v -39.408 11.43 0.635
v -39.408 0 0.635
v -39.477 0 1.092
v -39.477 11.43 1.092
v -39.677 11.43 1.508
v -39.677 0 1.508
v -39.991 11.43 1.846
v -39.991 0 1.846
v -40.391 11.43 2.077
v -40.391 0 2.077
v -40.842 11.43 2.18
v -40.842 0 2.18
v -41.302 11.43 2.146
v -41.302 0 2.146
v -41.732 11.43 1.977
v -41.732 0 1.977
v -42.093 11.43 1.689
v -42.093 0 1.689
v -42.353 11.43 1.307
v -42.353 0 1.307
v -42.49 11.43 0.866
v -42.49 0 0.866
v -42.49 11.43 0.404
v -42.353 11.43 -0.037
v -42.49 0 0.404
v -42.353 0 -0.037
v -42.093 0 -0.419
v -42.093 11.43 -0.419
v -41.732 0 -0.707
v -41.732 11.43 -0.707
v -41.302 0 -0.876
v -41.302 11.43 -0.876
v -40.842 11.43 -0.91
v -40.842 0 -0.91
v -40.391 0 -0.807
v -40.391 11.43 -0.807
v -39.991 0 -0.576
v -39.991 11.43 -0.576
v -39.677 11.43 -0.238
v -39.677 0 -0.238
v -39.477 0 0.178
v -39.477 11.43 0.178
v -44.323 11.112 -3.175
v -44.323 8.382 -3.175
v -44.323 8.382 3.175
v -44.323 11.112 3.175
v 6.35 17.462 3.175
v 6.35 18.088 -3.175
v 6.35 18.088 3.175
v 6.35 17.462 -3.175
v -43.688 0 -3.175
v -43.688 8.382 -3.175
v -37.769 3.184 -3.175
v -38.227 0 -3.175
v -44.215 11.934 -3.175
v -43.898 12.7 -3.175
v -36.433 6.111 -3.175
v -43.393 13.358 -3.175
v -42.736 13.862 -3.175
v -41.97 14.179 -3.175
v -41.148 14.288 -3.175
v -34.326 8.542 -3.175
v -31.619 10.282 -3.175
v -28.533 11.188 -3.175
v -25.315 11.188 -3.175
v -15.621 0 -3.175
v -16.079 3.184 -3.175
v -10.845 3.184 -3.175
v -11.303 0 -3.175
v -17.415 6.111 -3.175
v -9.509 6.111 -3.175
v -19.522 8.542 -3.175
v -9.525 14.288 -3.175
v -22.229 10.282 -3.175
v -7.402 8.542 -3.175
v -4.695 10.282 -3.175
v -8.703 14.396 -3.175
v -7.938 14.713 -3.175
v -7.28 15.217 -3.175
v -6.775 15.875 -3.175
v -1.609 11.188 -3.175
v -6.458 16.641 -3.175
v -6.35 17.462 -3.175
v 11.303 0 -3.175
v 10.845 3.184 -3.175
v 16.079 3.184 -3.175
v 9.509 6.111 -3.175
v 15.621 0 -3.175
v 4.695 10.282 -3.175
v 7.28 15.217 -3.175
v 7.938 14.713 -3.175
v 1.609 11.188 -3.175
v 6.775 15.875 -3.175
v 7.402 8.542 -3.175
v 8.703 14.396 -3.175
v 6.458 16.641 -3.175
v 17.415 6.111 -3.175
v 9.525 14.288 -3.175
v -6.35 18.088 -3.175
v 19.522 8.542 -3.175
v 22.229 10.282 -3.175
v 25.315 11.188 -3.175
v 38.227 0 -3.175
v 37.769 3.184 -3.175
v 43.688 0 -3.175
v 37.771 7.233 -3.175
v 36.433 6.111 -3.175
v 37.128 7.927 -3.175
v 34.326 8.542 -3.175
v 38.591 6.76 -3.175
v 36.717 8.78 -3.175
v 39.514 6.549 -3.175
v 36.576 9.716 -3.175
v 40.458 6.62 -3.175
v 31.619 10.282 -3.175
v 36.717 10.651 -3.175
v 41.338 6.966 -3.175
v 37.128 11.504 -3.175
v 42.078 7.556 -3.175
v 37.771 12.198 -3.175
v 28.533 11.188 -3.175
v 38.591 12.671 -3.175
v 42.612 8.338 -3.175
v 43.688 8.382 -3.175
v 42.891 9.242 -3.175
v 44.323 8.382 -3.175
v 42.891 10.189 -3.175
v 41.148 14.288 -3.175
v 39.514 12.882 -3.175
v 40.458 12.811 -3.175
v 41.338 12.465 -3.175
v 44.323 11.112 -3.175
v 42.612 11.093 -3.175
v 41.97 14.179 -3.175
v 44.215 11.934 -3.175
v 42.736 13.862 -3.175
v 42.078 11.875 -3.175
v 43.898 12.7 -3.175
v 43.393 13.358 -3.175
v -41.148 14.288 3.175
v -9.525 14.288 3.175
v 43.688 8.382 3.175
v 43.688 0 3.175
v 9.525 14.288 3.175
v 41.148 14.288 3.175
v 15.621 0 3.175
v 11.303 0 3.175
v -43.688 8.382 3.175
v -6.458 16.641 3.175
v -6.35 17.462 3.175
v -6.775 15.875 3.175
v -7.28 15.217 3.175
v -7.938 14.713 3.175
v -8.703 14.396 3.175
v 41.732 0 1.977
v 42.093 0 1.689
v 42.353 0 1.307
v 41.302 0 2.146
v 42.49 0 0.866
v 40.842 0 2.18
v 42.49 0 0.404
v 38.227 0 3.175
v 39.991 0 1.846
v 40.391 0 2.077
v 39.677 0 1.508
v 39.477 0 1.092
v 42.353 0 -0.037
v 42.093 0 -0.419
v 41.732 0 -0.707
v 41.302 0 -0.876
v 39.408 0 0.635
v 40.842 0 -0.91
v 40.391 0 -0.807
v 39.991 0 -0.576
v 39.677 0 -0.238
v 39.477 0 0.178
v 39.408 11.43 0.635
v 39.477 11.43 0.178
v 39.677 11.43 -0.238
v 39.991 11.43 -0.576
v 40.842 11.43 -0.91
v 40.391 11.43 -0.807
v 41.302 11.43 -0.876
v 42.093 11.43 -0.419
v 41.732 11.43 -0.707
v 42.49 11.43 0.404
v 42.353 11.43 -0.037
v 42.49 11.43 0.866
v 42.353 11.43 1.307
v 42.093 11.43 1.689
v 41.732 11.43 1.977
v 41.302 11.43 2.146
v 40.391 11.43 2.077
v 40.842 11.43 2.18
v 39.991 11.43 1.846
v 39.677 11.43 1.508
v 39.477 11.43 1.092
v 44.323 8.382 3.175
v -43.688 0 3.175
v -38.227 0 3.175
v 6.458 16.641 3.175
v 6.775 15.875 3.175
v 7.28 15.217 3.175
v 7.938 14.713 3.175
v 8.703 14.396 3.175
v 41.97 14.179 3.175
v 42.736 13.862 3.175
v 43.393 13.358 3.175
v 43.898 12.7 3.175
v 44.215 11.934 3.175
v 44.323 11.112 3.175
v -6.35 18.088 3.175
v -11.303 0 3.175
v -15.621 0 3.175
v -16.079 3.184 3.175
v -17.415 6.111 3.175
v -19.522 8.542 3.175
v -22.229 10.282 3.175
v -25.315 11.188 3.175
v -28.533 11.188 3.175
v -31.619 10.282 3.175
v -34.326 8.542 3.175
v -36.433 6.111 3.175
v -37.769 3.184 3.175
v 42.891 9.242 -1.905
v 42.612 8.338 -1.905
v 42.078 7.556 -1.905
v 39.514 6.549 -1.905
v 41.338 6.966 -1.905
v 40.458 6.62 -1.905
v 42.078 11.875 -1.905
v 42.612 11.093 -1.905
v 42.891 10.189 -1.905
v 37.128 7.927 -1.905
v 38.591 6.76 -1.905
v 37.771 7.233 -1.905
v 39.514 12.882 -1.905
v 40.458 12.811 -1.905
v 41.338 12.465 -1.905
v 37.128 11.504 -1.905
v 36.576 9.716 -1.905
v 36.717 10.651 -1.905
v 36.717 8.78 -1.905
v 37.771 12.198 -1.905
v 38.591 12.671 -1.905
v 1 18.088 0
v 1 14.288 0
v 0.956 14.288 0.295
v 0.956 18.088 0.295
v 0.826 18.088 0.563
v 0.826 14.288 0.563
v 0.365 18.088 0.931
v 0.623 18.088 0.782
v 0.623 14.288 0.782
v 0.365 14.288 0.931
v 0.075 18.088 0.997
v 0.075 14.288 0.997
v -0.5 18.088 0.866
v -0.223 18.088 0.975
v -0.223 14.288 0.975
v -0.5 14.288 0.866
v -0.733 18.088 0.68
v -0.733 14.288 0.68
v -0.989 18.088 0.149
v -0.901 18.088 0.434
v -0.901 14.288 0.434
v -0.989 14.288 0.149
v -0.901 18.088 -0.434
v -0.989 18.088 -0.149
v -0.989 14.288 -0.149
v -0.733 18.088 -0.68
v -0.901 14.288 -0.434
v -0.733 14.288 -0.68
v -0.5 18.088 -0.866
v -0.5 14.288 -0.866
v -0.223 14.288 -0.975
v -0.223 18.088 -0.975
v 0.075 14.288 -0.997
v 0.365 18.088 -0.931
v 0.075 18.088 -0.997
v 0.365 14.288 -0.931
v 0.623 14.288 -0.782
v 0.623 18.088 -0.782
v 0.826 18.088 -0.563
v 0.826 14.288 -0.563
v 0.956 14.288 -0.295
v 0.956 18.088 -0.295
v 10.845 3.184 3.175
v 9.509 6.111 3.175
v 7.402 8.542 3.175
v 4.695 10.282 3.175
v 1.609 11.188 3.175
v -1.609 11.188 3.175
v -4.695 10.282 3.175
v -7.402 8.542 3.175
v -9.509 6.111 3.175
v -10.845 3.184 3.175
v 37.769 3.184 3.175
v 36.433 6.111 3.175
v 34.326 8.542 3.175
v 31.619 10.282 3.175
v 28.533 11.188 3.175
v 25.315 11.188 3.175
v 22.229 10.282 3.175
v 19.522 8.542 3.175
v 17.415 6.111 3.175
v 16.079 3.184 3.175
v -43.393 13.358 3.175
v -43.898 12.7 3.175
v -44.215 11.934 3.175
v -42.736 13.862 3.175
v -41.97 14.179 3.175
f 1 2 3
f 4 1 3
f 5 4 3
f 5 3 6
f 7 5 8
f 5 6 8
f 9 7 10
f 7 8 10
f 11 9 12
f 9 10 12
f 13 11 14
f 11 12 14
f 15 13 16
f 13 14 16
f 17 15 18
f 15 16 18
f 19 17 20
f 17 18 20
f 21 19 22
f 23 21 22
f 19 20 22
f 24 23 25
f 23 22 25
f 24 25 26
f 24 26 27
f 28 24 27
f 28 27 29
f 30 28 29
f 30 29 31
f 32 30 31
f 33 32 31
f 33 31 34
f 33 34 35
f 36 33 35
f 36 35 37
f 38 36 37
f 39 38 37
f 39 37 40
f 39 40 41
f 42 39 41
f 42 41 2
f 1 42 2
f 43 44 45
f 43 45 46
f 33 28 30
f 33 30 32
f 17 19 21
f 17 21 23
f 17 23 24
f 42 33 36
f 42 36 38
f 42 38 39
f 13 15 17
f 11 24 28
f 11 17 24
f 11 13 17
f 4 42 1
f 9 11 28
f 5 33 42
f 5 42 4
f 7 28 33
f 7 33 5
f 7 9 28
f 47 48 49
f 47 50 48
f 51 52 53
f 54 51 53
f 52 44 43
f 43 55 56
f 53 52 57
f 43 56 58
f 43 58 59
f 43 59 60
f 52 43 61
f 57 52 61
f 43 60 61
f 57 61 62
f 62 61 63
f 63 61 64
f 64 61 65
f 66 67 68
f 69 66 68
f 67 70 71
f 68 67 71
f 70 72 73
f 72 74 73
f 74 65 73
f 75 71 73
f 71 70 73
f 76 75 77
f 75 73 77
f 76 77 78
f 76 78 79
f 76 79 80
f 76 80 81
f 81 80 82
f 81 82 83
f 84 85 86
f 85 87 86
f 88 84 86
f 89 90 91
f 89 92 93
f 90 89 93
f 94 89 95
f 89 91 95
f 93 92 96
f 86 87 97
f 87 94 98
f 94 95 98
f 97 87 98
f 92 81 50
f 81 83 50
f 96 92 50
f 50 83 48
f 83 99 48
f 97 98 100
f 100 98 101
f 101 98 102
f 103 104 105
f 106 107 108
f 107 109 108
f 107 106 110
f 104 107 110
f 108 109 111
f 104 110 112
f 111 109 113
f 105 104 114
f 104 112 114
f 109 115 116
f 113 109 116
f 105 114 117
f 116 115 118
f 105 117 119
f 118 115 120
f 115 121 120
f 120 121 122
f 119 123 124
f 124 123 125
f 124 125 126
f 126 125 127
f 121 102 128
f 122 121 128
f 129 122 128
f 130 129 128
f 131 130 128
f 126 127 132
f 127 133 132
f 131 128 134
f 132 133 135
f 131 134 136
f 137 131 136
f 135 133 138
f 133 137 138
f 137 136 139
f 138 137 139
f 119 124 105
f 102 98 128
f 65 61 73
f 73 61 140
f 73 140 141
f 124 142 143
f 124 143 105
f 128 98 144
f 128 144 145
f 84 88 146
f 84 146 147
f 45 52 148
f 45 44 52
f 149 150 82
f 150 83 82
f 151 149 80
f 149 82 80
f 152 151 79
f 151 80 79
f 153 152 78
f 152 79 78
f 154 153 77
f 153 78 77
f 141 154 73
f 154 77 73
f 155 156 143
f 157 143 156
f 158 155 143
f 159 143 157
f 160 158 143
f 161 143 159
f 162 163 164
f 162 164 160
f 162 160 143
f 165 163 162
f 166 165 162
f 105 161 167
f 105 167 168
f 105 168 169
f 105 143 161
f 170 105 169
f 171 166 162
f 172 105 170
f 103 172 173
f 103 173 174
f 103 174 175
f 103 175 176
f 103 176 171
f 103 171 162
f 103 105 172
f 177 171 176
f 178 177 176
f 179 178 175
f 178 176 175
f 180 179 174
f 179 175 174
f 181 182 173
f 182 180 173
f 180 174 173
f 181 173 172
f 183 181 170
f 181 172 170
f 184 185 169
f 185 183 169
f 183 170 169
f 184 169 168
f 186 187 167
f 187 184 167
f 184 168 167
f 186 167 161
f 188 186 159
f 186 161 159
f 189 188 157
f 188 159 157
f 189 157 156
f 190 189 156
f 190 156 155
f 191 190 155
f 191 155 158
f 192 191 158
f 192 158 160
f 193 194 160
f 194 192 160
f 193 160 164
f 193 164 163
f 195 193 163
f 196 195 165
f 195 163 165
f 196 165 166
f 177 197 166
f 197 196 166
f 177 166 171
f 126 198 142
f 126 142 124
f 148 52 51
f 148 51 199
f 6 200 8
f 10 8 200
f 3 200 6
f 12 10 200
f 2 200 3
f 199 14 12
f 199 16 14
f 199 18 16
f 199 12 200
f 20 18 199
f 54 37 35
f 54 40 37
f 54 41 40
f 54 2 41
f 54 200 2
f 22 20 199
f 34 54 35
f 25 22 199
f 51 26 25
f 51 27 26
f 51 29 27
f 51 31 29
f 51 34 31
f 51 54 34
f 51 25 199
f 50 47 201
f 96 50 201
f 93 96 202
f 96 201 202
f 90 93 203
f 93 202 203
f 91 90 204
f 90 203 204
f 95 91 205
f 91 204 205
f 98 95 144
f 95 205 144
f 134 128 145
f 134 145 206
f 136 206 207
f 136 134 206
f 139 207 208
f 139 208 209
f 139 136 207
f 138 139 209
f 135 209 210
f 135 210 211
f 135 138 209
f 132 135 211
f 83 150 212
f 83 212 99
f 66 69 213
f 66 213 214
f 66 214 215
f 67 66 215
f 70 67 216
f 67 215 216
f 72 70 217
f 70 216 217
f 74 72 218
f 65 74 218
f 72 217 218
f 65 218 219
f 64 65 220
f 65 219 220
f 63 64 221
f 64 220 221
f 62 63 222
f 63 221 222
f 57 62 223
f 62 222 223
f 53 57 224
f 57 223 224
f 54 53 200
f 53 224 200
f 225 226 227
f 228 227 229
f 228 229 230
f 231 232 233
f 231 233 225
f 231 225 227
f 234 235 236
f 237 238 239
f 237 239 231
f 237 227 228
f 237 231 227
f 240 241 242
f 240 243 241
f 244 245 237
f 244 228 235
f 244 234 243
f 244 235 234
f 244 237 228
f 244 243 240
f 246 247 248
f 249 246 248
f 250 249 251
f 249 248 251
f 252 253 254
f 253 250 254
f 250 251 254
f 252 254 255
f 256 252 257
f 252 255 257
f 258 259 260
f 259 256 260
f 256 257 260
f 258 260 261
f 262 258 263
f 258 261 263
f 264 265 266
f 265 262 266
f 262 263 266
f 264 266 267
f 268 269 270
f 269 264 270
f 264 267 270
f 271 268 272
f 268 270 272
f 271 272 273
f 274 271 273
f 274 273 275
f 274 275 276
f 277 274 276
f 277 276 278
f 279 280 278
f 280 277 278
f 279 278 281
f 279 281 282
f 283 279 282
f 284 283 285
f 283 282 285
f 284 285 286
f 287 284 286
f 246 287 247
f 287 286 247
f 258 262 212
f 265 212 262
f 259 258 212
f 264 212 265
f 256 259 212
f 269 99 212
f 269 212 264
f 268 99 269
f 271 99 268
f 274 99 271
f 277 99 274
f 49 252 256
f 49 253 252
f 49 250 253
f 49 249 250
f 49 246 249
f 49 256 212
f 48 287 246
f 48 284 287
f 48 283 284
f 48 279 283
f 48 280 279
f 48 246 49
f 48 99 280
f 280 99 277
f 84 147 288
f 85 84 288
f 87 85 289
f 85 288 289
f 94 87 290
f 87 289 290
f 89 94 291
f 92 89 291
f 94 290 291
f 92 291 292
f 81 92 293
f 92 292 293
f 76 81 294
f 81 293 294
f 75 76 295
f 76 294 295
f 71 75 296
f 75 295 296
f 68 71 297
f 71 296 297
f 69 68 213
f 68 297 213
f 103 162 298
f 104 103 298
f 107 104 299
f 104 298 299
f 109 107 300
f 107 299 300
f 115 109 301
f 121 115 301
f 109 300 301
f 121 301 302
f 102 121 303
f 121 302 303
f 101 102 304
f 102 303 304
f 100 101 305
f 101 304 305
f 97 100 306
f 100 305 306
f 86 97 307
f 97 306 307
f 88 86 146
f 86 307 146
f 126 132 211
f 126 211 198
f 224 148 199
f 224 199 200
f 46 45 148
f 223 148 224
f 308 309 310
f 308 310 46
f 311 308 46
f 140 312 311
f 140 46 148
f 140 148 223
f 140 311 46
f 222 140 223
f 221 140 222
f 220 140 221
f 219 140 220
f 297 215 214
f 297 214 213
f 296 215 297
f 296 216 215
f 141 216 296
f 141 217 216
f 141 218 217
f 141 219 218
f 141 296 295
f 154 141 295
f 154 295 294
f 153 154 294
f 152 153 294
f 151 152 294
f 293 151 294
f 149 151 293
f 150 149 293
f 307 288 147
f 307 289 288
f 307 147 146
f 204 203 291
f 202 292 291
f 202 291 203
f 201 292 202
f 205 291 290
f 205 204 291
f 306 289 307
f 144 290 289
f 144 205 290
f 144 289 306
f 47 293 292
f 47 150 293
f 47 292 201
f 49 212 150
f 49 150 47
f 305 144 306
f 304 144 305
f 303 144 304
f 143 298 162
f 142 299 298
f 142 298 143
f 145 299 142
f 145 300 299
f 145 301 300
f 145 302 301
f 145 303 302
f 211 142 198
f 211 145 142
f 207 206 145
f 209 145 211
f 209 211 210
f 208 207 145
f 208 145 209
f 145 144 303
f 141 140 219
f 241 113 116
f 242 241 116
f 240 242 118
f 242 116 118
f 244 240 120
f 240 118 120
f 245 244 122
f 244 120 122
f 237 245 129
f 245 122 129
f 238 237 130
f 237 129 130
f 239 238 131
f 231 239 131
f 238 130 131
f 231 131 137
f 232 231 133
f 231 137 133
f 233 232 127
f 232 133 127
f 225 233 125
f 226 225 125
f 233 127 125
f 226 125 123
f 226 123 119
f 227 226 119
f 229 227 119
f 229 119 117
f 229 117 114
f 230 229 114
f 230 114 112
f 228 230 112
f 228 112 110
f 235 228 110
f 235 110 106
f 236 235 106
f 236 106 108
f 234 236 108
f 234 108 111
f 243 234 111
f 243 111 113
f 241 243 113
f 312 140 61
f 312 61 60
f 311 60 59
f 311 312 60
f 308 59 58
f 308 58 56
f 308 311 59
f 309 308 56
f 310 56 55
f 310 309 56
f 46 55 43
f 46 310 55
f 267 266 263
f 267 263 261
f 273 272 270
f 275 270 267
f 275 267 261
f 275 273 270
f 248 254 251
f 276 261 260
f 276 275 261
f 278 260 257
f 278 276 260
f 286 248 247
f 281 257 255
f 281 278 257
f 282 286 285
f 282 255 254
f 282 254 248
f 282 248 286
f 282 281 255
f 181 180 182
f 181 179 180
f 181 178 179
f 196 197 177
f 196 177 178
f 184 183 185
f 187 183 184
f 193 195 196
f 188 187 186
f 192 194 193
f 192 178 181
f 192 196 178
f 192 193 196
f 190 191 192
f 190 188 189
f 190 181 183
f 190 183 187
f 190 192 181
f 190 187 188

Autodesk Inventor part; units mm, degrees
ref_plane "YZ Plane" through (0, 0, 0) normal (1, 0, 0) x (0, 1, 0)
ref_plane "XZ Plane" through (0, 0, 0) normal (0, 1, 0) x (-1, 0, 0)
ref_plane "XY Plane" through (0, 0, 0) normal (0, 0, 1) x (1, 0, 0)
sketch "Sketch1" plane through (0, 0, 0) normal (0, 0, 1) x (1, 0, 0)
  line L0 (-44.323, 14.2875) -> (44.323, 14.2875)
  line L1 (44.323, 14.2875) -> (44.323, -14.2875)
  line L2 (44.323, -14.2875) -> (-44.323, -14.2875)
  line L3 (-44.323, -14.2875) -> (-44.323, 14.2875)
  point P0 (0, 0)
  dimension "d0" = 88.646
  dimension "d1" = 44.323
  dimension "d2" = 14.2875
  dimension "d3" = 28.575
extrude "Extrusion1" add sketch "Sketch1" along normal mid plane 6.35
sketch "Sketch2" plane through (0, 0, 3.175) normal (0, 0, 1) x (1, 0, 0)
  circle A0 centre (-26.924, 0) radius 11.303
  circle A1 centre (0, 0) radius 11.303
  line L0 (44.323, -14.2875) -> (44.323, 14.2875) projected
  circle A2 centre (26.924, 0) radius 11.303
  line L1 (-44.323, 14.2875) -> (-44.323, -14.2875) projected
  line L2 (-44.323, 0) -> (44.323, 0) construction
  line L3 (44.323, 14.2875) -> (-44.323, 14.2875) projected
  point P0 (0, 0)
  dimension "d6" = 22.606
  dimension "d9" = 22.606
  dimension "d11" = 22.606
  dimension "d14" = 26.924
  dimension "d21" = 88.646
  dimension "d22" = 26.924
  dimension "d45" = 0
sketch "Sketch4" plane through (-44.323, -14.2875, -3.175) normal (-1, 0, 0) x (0, 0, 1)
  line L0 (0, 0) -> (0, 28.575) projected
  line L1 (6.35, 28.575) -> (6.35, 0) projected
  line L2 (0, 22.6695) -> (6.35, 22.6695)
  line L3 (6.35, 22.6695) -> (6.35, 5.9055)
  line L4 (6.35, 5.9055) -> (0, 5.9055)
  line L5 (0, 5.9055) -> (0, 22.6695)
  point P0 (3.175, 14.2875)
  dimension "d30" = 8.382
  dimension "d31" = 16.764
extrude "Extrusion3" cut sketch "Sketch4" against normal blind 0.635
mirror "Mirror1" about plane through (0, 0, 0) normal (1, 0, 0) of "Extrusion3"
sketch "Sketch11" plane through (0, 0, -3.175) normal (0, 0, -1) x (-1, 0, 0)
  circle A0 centre (-39.751, 9.7155) radius 3.175
  line L0 (-44.323, 14.2875) -> (-44.323, 8.382) projected
  line L1 (44.323, 14.2875) -> (-44.323, 14.2875) projected
  point P0 (0, 0)
  dimension "d72" = 4.572
  dimension "d73" = 4.572
  dimension "d74" = 6.35
extrude "Extrusion10" cut sketch "Sketch11" against normal blind 1.27
sketch "Sketch7" plane through (-44.323, -14.2875, 3.175) normal (0, -1, 0) x (1, 0, 0)
  line L0 (30.353, -14.605) -> (58.293, -14.605)
  line L1 (58.293, -14.605) -> (58.293, 8.255)
  line L2 (58.293, 8.255) -> (30.353, 8.255)
  line L3 (30.353, 8.255) -> (30.353, -14.605)
  point P0 (44.323, -3.175)
  dimension "d39" = 27.94
  dimension "d40" = 22.86
  dimension "d41" = 11.43
  dimension "d42" = 13.97
extrude "Extrusion5" [suppressed]
extrude "Extrusion6" cut sketch "Sketch2" against normal blind 25.4
sketch "Sketch8" plane through (0, 0, -3.175) normal (0, 0, -1) x (-1, 0, 0)
  line L0 (43.688, 8.382) -> (43.688, -8.382) construction
  line L1 (43.688, 0) -> (-43.688, 0)
  line L2 (-43.688, 8.382) -> (-43.688, -8.382) construction
  line L3 (44.323, 14.2875) -> (-44.323, 14.2875) projected
  line L4 (44.323, 8.382) -> (44.323, 14.2875) projected
  line L5 (-44.323, 14.2875) -> (-44.323, 8.382) projected
  line L6 (-43.688, 8.382) -> (-43.688, 0)
  line L7 (-44.323, 8.382) -> (-43.688, 8.382) projected
  line L8 (43.688, 8.382) -> (43.688, 0)
  line L9 (43.688, 8.382) -> (44.323, 8.382) projected
  point P0 (0, 0)
extrude "Extrusion7" [suppressed]
sketch "Sketch9" plane through (0, 0, -3.175) normal (0, 0, -1) x (-1, 0, 0)
  line L0 (-44.323, -14.2875) -> (44.323, -14.2875) projected
  line L1 (44.323, -14.2875) -> (44.323, -8.382) projected
  line L2 (44.323, -8.382) -> (43.688, -8.382) projected
  line L3 (-43.688, -8.382) -> (-44.323, -8.382) projected
  line L4 (-44.323, -8.382) -> (-44.323, -14.2875) projected
  line L5 (-43.688, 8.382) -> (-43.688, -8.382) projected
  line L6 (-43.688, 0) -> (-43.688, -8.382)
  line L7 (-43.688, 0) -> (43.688, 0)
  line L8 (43.688, -8.382) -> (43.688, 8.382) projected
  line L9 (43.688, -8.382) -> (43.688, 0)
  point P0 (0, 0)
extrude "Extrusion8" cut sketch "Sketch9" against normal through all
sketch "Sketch10" plane through (-43.688, 0, -3.175) normal (0, -1, 0) x (1, 0, 0)
  line L0 (5.461, 6.35) -> (5.461, 0) projected
  line L1 (0, 0) -> (0, 6.35) projected
  line L2 (-0.635, 0) -> (-0.635, 6.35) projected
  line L3 (5.461, 6.35) -> (5.461, 0) projected
  line L4 (0, 6.35) -> (5.461, 6.35) projected
  line L5 (0, 0) -> (0, 6.35) projected
  line L6 (5.461, 0) -> (0, 0) projected
  circle A0 centre (2.7305, 3.81) radius 1.5494
  line L7 (86.614, 1.27) -> (80.264, 1.27) projected
  line L8 (86.614, 0) -> (80.264, 0) projected
  point P0 (43.688, 3.175)
  point P1 (84.328, 1.27)
  point P2 (77.978, 1.27)
  point P3 (84.328, 0)
  point P4 (77.978, 0)
  dimension "d58" = 3.0988
  dimension "d61" = 5.461
  dimension "d62" = 2.7305
  dimension "d77" = 5.08
  dimension "d78" = 2.54
extrude "Extrusion9" cut sketch "Sketch10" against normal blind 11.43 contours A0
mirror "Mirror2" about plane through (0, 0, 0) normal (1, 0, 0) of "Extrusion9"
thread "Thread1" size "5-40 UNC" class "2B" standard "ANSI Unified Screw Threads" full length
thread "Thread2" size "5-40 UNC" class "2B" standard "ANSI Unified Screw Threads" full length
fillet "Fillet1" radius 3.175 2 edges at (-44.323, 14.2875, 0) (44.323, 14.2875, 0)
sketch "Sketch12" plane through (-41.148, 14.2875, -3.175) normal (0, 1, 0) x (1, 0, 0)
  line L0 (82.296, -6.35) -> (0, -6.35) projected
  line L1 (34.798, 0) -> (47.498, 0)
  line L2 (47.498, 0) -> (47.498, -6.35)
  line L3 (47.498, -6.35) -> (34.798, -6.35)
  line L4 (34.798, -6.35) -> (34.798, 0)
  circle A0 centre (41.148, -3.175) radius 1
  line L5 (29.845, 0) -> (52.451, 0) projected
  dimension "d81" = 6.35
  dimension "d82" = 12.7
  dimension "d83" = 2
  dimension "d87" = 0
extrude "Extrusion11" add sketch "Sketch12" along normal blind 3.8
fillet "Fillet3" radius 3.175 2 edges at (6.35, 14.2875, 0) (-6.35, 14.2875, 0)
equation "\"d1\" = 0.5 * d0"
equation "\"d2\" = 0.5 * d3"
equation "\"d9\" = d7"
equation "\"d11\" = d9"
equation "\"d22\" = d14"
equation "\"d30\" = 0.5 * d31"
equation "\"d41\" = 0.5 * d40"
equation "\"d42\" = 0.5 * d39"
equation "\"d62\" = 0.5 * d61"
equation "\"d78\" = 0.5 * d77"
equation "\"d81\" = 0.5 * d82"
equation "\"d7\" = d6"
properties part number "Tube Holder Halve 2" material "Aluminum 6061-AHC"
